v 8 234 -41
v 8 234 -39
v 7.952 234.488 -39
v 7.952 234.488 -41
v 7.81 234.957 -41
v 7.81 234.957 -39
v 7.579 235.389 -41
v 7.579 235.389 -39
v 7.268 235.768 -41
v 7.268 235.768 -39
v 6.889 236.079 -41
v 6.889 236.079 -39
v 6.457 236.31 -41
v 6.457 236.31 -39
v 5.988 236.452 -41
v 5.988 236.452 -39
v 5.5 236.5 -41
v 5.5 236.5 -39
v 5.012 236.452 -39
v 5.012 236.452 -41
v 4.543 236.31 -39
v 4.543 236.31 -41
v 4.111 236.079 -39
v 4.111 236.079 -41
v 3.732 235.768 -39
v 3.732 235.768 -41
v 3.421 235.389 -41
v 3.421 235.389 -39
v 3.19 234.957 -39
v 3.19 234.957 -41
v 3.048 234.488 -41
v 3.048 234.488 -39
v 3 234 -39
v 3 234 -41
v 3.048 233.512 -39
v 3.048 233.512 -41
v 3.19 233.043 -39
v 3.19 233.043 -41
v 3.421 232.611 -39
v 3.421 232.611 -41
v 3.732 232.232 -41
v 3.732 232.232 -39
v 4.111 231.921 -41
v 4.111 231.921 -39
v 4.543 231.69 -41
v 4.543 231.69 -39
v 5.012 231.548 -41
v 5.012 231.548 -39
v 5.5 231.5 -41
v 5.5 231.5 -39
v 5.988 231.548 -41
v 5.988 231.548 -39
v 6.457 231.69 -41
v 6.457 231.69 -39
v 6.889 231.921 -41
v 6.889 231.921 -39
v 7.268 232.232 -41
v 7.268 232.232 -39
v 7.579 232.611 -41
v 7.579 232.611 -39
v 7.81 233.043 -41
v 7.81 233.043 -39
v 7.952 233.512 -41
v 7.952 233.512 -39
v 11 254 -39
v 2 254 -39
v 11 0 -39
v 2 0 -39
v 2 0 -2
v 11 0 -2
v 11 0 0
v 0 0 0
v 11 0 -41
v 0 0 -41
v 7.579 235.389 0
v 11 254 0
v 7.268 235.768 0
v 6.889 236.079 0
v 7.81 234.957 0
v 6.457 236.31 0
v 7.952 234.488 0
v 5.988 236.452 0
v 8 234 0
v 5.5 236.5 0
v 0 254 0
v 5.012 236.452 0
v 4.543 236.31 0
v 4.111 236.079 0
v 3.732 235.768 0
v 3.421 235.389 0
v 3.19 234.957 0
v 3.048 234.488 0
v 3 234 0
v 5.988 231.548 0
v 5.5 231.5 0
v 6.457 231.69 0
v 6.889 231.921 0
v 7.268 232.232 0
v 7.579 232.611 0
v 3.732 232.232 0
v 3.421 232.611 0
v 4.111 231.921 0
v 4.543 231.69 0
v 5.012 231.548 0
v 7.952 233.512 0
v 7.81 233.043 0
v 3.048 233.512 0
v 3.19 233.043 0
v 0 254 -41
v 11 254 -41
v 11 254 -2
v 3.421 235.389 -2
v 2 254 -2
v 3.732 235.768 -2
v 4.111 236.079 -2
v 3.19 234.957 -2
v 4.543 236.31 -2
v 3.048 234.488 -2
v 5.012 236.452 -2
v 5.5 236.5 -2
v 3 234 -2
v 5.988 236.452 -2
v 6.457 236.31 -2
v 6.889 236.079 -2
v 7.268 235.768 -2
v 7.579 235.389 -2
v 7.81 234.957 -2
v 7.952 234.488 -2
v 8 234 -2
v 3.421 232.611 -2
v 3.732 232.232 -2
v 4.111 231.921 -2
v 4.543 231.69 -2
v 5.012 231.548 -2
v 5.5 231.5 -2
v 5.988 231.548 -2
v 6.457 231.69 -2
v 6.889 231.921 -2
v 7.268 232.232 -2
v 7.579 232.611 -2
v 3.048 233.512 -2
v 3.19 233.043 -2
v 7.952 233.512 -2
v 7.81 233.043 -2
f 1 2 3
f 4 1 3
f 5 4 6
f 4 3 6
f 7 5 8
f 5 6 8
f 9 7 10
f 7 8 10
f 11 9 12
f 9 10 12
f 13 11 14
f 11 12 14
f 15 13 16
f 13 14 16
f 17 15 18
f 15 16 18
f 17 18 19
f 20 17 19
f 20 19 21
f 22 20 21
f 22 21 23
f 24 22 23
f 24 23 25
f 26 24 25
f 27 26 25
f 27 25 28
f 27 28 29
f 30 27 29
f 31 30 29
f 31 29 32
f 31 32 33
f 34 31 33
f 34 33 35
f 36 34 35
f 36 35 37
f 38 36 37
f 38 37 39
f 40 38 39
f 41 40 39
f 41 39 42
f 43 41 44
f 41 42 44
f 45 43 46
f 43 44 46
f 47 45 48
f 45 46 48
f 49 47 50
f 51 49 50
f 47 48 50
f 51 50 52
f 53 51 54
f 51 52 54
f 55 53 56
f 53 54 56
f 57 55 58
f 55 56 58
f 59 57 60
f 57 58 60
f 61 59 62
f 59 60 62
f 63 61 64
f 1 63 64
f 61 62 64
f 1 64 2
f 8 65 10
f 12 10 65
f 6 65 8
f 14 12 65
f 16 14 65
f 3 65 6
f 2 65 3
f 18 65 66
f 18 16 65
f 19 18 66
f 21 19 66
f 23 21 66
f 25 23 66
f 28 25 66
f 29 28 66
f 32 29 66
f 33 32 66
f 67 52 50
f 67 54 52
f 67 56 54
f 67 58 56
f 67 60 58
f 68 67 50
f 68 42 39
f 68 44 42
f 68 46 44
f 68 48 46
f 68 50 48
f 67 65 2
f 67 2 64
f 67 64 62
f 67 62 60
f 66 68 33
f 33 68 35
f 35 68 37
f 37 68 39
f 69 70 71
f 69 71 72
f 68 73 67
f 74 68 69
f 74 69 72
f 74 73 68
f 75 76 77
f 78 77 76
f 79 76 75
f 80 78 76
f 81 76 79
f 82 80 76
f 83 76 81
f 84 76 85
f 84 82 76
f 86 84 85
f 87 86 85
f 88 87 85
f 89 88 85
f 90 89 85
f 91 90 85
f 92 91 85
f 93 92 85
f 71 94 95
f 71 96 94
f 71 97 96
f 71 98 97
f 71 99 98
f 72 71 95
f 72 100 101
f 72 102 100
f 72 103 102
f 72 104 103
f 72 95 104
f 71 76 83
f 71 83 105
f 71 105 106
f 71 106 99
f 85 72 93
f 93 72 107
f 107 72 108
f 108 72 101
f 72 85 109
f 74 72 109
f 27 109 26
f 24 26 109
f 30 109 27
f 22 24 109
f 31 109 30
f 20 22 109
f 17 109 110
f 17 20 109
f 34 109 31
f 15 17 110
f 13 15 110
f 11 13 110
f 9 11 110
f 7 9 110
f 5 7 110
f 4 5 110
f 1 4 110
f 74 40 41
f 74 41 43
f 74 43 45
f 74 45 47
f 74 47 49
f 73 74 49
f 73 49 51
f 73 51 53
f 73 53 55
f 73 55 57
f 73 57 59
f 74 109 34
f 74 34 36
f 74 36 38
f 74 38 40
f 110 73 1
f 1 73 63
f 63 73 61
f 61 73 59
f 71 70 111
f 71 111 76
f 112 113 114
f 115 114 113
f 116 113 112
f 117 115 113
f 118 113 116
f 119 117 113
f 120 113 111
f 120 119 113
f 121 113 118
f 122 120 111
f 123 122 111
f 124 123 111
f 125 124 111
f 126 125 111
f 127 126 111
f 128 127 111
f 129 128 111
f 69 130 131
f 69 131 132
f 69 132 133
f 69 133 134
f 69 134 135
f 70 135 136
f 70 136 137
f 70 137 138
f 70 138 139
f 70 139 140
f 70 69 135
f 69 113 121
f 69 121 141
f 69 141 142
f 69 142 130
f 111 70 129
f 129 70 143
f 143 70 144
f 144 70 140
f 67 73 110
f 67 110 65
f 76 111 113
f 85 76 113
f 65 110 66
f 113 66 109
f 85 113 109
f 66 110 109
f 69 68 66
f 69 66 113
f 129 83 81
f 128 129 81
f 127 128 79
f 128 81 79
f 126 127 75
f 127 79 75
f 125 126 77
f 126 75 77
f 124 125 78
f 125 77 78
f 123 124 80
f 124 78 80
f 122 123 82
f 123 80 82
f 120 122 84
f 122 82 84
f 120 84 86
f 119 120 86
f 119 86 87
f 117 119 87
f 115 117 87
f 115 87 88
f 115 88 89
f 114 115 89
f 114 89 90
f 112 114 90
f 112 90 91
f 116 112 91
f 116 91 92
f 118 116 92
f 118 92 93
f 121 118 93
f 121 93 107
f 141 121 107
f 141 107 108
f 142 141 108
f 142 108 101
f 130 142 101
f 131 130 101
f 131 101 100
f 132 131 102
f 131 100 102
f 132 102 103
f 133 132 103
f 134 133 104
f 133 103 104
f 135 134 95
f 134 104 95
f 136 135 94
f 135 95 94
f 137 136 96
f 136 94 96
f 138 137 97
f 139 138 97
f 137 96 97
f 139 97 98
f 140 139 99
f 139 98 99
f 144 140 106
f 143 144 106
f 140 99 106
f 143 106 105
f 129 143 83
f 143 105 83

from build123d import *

# Parameters (mm, degrees)
BOSS_EXTRUDE1_DEPTH = 254
SKETCH2_R           = 2.5
CUT_EXTRUDE1_DEPTH  = 42


with BuildPart() as part:
    # Sketch1 → Boss-Extrude1 (new body)
    with BuildSketch(Plane(origin=(0, 0, 0), x_dir=(1, 0, 0), z_dir=(0, 1, 0))):
        Polygon((0, 0), (0, 41), (11, 41), (11, 39), (2, 39), (2, 2), (11, 2), (11, 0), align=None)
    extrude(amount=BOSS_EXTRUDE1_DEPTH)

    # Sketch2 → Cut-Extrude1 (cut, through all)
    with BuildSketch(Plane.XY):
        with Locations((5.5, 234)):
            Circle(SKETCH2_R)
    extrude(amount=-CUT_EXTRUDE1_DEPTH, mode=Mode.SUBTRACT)


solid = part.part
